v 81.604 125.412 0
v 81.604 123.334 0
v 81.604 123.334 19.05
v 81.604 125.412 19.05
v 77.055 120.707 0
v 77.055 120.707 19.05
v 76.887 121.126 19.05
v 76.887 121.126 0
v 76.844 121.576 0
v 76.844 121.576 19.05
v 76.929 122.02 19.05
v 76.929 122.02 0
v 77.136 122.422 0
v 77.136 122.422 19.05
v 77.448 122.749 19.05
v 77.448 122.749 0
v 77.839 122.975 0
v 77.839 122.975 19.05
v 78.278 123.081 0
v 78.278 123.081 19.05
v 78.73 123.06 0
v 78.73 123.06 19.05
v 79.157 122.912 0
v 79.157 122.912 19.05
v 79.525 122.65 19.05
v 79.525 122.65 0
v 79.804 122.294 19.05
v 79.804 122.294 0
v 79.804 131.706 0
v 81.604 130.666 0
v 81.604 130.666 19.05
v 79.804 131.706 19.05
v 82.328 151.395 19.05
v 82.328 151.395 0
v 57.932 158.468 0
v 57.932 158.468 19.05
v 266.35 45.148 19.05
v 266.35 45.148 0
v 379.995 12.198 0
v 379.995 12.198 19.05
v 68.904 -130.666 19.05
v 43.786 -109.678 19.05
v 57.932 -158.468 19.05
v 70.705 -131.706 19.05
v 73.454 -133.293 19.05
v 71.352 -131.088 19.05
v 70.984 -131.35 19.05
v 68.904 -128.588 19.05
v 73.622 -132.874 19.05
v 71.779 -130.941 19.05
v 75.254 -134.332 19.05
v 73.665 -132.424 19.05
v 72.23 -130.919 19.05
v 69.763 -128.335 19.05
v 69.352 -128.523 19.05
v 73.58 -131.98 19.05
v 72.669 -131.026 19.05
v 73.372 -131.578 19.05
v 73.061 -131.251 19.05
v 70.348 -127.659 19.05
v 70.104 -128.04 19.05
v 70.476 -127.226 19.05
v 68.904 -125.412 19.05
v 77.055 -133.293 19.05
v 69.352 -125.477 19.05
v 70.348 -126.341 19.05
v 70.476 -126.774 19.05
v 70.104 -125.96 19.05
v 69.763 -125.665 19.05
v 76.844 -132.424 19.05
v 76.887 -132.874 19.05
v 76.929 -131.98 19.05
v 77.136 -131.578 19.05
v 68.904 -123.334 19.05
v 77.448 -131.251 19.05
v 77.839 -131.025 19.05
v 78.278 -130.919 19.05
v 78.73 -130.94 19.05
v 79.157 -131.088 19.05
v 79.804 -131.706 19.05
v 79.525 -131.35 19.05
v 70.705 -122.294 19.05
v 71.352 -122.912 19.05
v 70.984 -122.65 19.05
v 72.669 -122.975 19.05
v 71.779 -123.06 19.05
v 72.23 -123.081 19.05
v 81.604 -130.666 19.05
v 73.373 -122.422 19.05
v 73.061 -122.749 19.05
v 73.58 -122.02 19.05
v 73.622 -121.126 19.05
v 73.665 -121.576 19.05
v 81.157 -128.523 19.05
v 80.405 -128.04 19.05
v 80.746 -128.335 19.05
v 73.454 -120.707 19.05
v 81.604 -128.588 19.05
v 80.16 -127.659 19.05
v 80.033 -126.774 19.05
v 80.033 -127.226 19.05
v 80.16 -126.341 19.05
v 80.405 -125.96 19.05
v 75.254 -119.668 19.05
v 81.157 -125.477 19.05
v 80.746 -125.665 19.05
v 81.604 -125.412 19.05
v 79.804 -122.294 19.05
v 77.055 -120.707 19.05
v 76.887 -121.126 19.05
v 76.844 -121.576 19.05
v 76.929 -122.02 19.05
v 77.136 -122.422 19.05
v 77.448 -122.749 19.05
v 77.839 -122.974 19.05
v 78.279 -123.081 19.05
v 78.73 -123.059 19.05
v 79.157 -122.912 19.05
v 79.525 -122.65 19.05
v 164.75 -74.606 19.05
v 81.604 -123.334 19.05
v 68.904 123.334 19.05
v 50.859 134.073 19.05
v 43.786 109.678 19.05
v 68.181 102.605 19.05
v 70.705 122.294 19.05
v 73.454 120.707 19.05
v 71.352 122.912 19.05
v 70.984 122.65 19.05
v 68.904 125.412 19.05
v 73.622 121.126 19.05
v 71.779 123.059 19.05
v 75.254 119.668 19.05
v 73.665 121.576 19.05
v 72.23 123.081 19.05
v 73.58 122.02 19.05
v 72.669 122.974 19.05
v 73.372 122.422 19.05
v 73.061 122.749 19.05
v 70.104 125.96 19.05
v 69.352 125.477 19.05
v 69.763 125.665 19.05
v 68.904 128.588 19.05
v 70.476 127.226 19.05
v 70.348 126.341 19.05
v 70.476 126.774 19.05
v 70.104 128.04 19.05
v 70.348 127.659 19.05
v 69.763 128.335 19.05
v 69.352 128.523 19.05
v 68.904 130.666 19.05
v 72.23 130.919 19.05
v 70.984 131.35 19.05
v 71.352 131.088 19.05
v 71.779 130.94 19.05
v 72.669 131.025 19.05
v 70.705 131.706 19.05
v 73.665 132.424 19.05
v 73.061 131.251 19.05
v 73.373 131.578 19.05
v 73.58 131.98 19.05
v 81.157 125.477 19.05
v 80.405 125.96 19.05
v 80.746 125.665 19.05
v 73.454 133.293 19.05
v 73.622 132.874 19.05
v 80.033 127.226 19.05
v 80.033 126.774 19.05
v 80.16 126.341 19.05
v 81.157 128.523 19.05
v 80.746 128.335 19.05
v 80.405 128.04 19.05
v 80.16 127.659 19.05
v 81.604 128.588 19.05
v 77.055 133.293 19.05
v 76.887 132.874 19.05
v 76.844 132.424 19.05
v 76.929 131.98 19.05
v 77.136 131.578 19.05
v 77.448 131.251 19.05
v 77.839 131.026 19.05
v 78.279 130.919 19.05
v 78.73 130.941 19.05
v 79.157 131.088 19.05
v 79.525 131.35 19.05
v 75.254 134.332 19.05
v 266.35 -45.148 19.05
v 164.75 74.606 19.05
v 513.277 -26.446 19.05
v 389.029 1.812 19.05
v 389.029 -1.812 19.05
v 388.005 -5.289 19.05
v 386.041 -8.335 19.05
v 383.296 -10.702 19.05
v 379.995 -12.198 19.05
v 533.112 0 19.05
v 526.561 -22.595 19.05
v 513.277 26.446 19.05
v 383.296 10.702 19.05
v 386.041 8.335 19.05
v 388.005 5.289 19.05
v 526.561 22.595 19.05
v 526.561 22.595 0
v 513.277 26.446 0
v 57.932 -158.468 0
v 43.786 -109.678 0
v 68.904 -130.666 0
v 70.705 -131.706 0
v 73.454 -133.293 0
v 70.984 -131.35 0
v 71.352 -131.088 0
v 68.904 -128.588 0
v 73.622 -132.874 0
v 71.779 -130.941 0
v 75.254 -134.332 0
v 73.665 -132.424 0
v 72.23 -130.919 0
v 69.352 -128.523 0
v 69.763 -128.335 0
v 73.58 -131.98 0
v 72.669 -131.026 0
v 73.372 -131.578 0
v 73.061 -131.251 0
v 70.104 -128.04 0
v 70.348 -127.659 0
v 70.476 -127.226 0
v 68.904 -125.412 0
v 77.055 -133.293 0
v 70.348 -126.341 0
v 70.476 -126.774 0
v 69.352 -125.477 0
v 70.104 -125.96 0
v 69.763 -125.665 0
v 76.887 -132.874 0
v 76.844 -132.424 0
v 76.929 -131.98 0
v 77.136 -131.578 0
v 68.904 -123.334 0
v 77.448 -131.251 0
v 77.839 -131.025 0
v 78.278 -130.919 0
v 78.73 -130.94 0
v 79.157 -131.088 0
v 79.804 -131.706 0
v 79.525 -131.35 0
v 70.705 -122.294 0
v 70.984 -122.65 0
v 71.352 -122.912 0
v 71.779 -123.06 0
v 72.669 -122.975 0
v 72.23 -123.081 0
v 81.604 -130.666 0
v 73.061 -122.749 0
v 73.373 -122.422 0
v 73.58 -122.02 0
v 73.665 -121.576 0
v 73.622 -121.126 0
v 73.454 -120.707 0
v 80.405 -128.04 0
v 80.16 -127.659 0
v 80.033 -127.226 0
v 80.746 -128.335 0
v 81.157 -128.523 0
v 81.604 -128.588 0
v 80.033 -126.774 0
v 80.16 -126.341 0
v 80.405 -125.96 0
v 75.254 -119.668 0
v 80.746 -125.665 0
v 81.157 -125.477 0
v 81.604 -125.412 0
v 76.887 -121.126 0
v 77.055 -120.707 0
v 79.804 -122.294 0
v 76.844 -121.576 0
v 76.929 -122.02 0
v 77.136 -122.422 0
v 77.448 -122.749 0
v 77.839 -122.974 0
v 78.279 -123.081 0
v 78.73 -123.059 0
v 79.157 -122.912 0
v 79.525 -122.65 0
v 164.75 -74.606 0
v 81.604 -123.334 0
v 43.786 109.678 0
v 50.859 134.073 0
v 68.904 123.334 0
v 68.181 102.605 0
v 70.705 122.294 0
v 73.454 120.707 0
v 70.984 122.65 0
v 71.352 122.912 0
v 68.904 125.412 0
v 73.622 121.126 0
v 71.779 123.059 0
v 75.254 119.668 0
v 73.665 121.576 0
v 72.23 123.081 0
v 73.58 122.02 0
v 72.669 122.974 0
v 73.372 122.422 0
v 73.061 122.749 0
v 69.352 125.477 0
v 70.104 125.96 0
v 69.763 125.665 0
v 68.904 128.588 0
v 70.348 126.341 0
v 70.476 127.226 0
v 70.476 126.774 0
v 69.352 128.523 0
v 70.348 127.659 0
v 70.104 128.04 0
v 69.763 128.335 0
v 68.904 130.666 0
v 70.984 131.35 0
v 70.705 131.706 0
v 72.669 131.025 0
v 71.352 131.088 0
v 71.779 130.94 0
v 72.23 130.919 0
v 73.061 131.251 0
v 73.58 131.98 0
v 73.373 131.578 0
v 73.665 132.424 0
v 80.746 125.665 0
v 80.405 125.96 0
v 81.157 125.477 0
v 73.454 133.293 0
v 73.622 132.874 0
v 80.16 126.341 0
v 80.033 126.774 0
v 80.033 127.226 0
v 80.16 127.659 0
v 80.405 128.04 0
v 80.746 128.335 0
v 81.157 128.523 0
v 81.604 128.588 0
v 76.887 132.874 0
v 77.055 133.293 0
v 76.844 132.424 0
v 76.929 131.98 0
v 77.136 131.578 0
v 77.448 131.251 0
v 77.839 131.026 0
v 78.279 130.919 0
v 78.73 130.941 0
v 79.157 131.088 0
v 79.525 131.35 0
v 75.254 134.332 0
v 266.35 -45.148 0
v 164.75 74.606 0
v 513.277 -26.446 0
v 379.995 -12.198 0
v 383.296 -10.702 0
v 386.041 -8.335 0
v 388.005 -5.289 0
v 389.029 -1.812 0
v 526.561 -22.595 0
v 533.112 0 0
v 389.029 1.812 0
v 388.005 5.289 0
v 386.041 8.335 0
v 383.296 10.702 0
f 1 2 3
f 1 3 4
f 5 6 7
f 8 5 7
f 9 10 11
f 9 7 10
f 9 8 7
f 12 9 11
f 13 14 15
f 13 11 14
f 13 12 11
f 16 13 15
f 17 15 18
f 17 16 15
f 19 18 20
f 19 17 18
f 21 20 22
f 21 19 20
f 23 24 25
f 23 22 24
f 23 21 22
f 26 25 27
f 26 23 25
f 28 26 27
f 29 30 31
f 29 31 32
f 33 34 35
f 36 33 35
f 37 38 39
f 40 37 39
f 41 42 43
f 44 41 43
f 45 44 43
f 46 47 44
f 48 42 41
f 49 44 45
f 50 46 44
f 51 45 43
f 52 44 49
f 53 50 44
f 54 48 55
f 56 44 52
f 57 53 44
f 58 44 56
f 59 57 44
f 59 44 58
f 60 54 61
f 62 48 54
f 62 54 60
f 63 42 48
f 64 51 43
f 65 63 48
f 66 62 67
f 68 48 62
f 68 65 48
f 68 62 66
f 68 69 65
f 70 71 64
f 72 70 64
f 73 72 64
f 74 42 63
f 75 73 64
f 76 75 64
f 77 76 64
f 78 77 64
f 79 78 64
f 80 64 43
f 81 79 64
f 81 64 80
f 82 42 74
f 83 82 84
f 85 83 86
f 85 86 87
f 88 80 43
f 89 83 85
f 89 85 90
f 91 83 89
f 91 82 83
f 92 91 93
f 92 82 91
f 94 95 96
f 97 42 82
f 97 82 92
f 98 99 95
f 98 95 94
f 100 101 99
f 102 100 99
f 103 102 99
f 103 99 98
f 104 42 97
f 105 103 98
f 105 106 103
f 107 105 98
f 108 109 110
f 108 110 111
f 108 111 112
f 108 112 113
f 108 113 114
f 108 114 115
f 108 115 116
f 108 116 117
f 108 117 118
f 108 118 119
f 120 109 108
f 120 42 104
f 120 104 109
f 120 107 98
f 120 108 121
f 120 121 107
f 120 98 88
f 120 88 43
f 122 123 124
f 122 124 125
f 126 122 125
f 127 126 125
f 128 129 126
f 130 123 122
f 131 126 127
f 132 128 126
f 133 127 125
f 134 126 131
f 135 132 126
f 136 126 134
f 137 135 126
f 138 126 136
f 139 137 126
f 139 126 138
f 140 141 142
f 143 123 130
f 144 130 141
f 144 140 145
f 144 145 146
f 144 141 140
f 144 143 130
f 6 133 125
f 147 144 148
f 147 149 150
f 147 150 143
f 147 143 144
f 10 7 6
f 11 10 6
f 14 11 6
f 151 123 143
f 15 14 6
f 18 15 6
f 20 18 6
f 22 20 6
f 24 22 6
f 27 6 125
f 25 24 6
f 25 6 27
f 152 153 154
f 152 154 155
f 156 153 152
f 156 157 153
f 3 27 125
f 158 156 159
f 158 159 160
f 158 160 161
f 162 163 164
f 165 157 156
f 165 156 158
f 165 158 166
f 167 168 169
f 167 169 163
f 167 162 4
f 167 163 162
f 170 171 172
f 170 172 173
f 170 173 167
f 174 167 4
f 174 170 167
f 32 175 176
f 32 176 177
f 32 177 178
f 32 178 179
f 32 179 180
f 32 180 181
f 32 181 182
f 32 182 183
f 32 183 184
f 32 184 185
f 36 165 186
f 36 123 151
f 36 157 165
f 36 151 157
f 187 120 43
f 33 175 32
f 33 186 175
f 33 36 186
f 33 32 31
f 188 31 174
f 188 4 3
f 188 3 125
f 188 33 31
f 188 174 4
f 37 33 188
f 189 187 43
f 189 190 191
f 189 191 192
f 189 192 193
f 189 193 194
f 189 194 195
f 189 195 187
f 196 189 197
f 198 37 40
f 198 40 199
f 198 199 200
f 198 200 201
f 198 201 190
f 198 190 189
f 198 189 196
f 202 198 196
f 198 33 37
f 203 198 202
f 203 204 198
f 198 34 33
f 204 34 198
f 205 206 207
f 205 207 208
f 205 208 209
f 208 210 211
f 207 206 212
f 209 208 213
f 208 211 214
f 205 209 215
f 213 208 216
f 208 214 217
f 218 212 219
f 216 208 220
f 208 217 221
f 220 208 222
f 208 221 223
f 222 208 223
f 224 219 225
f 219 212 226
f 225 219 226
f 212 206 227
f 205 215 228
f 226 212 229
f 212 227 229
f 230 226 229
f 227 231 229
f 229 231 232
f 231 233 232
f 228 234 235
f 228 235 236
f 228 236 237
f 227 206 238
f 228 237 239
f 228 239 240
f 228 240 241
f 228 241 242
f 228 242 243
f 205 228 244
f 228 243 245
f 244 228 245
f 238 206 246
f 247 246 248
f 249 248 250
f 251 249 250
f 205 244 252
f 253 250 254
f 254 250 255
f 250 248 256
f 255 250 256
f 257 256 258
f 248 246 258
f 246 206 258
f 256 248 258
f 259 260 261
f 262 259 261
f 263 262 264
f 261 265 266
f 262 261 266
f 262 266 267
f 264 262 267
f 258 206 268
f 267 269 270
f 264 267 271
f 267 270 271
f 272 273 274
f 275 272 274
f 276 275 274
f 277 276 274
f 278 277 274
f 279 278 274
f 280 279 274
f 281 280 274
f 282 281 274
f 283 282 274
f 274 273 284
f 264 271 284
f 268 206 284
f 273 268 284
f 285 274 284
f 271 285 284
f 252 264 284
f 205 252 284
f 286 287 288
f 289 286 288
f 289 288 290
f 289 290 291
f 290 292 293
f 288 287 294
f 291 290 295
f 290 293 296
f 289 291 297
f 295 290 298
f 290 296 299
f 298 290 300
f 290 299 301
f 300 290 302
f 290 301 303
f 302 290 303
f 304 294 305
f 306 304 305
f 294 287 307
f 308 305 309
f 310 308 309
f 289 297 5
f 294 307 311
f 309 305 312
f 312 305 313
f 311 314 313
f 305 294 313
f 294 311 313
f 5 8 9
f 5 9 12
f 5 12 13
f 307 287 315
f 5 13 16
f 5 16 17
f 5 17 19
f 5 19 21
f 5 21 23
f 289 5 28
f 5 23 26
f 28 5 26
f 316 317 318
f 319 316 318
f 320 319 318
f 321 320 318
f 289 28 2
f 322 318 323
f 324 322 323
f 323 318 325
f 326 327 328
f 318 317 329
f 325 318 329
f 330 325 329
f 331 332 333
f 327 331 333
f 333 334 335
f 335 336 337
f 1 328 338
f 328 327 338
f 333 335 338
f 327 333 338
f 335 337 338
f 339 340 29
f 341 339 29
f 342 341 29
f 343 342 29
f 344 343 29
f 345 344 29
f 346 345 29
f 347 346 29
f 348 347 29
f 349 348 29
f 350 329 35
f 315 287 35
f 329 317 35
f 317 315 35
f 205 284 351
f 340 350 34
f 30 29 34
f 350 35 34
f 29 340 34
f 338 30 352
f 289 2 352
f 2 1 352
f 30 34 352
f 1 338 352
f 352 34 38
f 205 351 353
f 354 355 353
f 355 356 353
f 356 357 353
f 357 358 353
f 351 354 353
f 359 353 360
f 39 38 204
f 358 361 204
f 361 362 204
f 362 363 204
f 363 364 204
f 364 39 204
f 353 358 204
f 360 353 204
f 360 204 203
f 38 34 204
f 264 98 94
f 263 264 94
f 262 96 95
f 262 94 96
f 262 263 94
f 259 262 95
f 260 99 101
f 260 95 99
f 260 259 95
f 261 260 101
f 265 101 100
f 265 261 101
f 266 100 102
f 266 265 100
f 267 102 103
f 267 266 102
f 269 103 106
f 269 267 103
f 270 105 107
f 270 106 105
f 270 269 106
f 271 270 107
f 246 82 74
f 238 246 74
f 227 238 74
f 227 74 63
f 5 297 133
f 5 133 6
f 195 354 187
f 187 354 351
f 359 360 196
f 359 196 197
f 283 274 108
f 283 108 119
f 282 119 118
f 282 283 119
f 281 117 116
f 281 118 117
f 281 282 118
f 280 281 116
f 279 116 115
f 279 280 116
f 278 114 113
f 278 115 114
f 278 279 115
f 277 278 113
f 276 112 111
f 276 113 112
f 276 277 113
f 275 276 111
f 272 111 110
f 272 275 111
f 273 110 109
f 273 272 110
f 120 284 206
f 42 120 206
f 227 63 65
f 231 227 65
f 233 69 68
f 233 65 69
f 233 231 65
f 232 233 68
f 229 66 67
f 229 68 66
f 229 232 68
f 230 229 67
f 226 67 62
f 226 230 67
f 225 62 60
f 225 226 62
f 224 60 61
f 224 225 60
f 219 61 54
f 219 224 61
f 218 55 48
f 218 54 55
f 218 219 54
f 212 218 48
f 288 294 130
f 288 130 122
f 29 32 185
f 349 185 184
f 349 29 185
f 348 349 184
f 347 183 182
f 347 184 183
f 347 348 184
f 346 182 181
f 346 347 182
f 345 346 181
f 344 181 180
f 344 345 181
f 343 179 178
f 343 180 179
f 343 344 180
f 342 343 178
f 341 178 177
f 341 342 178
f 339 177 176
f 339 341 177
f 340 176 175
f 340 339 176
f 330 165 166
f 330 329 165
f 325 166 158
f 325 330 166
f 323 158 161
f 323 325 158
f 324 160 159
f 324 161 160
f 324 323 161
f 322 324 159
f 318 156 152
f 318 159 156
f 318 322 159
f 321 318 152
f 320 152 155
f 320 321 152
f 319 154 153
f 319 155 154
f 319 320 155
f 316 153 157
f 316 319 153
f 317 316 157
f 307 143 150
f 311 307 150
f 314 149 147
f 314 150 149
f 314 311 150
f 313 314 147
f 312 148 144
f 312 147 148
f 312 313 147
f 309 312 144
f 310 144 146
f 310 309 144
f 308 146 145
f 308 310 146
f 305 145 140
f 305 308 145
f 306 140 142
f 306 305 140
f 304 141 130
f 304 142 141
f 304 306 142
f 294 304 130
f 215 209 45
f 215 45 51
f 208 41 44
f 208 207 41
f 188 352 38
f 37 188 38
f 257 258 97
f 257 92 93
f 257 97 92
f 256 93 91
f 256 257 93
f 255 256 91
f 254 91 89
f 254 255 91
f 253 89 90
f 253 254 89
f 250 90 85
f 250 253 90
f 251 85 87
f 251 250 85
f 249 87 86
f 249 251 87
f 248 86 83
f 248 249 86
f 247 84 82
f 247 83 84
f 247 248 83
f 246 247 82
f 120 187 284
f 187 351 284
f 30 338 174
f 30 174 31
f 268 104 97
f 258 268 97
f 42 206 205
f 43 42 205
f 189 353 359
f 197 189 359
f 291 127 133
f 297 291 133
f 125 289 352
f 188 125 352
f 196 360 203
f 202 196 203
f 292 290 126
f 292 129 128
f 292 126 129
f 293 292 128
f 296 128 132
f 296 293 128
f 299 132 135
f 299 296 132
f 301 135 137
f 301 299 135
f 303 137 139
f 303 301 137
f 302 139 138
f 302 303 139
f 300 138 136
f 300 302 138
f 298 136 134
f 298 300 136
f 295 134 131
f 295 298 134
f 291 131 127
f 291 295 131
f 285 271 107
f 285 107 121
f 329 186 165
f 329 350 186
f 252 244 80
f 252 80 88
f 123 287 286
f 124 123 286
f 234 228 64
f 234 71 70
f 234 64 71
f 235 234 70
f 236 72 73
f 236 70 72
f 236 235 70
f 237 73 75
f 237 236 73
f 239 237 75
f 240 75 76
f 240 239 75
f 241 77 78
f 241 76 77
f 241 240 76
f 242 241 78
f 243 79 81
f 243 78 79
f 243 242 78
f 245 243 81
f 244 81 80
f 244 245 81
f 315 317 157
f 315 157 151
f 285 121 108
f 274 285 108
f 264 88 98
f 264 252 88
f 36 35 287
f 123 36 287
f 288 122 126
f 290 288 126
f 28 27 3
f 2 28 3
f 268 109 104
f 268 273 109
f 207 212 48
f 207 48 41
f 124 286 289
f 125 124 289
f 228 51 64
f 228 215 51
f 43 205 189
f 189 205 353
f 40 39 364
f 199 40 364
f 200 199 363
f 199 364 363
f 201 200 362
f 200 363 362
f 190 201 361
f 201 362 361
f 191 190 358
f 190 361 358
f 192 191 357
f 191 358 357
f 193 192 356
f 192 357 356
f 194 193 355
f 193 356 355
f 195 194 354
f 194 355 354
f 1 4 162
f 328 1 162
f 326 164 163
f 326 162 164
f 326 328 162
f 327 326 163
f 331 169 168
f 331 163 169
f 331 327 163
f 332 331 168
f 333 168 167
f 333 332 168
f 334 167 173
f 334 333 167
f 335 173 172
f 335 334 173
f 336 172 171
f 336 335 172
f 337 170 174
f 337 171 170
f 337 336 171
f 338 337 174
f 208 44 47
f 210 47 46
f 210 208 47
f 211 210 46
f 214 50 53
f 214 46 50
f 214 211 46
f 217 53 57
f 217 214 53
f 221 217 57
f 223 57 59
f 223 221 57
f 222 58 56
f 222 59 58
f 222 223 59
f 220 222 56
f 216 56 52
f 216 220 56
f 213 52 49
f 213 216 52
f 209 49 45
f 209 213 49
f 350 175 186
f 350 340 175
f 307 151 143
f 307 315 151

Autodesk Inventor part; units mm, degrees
ref_plane "YZ Plane" through (0, 0, 0) normal (1, 0, 0) x (0, 1, 0)
ref_plane "XZ Plane" through (0, 0, 0) normal (0, 1, 0) x (-1, 0, 0)
ref_plane "Work Plane1" through (0, 0, 0) normal (0, 0, 1) x (1, 0, 0)
sketch "Sketch1" plane through (0, 0, 0) normal (0, 0, 1) x (1, 0, 0)
  line L0 (73.4542, 120.707) -> (75.2544, 119.6677) projected
  arc A0 (73.4542, 120.707) -> (70.7046, 122.2945) centre (72.0794, 121.5007) ccw projected
  line L1 (68.9044, 123.3338) -> (70.7046, 122.2945) projected
  line L2 (68.9044, 125.4125) -> (68.9044, 123.3338) projected
  arc A1 (68.9044, 125.4125) -> (68.9044, 128.5875) centre (68.9044, 127) ccw projected
  line L3 (68.9044, 130.6662) -> (68.9044, 128.5875) projected
  line L4 (70.7046, 131.7055) -> (68.9044, 130.6662) projected
  arc A2 (70.7046, 131.7055) -> (73.4542, 133.293) centre (72.0794, 132.4993) ccw projected
  line L5 (75.2544, 134.3323) -> (73.4542, 133.293) projected
  line L6 (77.0546, 133.293) -> (75.2544, 134.3323) projected
  arc A3 (77.0546, 133.293) -> (79.8042, 131.7055) centre (78.4294, 132.4993) ccw projected
  line L7 (81.6044, 130.6662) -> (79.8042, 131.7055) projected
  line L8 (81.6044, 128.5875) -> (81.6044, 130.6662) projected
  arc A4 (81.6044, 128.5875) -> (81.6044, 125.4125) centre (81.6044, 127) ccw projected
  line L9 (81.6044, 123.3338) -> (81.6044, 125.4125) projected
  line L10 (79.8042, 122.2945) -> (81.6044, 123.3338) projected
  arc A5 (79.8042, 122.2945) -> (77.0546, 120.707) centre (78.4294, 121.5007) ccw projected
  line L11 (75.2544, 119.6677) -> (77.0546, 120.707) projected
  circle A6 centre (75.2544, 127) radius 2.9337 projected
  line L12 (73.4542, -133.293) -> (75.2544, -134.3323) projected
  arc A7 (73.4542, -133.293) -> (70.7046, -131.7055) centre (72.0794, -132.4993) ccw projected
  line L13 (68.9044, -130.6662) -> (70.7046, -131.7055) projected
  line L14 (68.9044, -128.5875) -> (68.9044, -130.6662) projected
  arc A8 (68.9044, -128.5875) -> (68.9044, -125.4125) centre (68.9044, -127) ccw projected
  line L15 (68.9044, -123.3338) -> (68.9044, -125.4125) projected
  line L16 (70.7046, -122.2945) -> (68.9044, -123.3338) projected
  arc A9 (70.7046, -122.2945) -> (73.4542, -120.707) centre (72.0794, -121.5007) ccw projected
  line L17 (75.2544, -119.6677) -> (73.4542, -120.707) projected
  line L18 (77.0546, -120.707) -> (75.2544, -119.6677) projected
  arc A10 (77.0546, -120.707) -> (79.8042, -122.2945) centre (78.4294, -121.5007) ccw projected
  line L19 (81.6044, -123.3338) -> (79.8042, -122.2945) projected
  line L20 (81.6044, -125.4125) -> (81.6044, -123.3338) projected
  arc A11 (81.6044, -125.4125) -> (81.6044, -128.5875) centre (81.6044, -127) ccw projected
  line L21 (81.6044, -130.6662) -> (81.6044, -128.5875) projected
  line L22 (79.8042, -131.7055) -> (81.6044, -130.6662) projected
  arc A12 (79.8042, -131.7055) -> (77.0546, -133.293) centre (78.4294, -132.4993) ccw projected
  line L23 (75.2544, -134.3323) -> (77.0546, -133.293) projected
  circle A13 centre (75.2544, -127) radius 2.9337 projected
  line L24 (75.2544, -127) -> (513.2774, 0) construction
  line L25 (106.8774, 406.4) -> (106.8774, -406.4) projected
  line L26 (106.8774, 0) -> (513.2774, 0)
  line L27 (513.2774, 0) -> (75.2544, 127) construction
  line L28 (75.2544, 127) -> (68.1812, 102.6047) construction
  line L29 (75.2544, 127) -> (82.3275, 151.3953) construction
  line L30 (75.2544, 127) -> (50.8591, 134.0732) construction
  line L31 (82.3275, 151.3953) -> (57.9322, 158.4684)
  line L32 (57.9322, 158.4684) -> (50.8591, 134.0732)
  line L33 (50.8591, 134.0732) -> (43.7859, 109.6779)
  line L34 (43.7859, 109.6779) -> (68.1812, 102.6047)
  line L35 (82.3275, 151.3953) -> (513.2774, 26.4461)
  line L36 (68.1812, 102.6047) -> (164.7505, 74.6055)
  line L37 (538.647, 19.0904) -> (533.1119, 0)
  line L38 (524.5007, 29.7002) -> (513.2774, 26.4461)
  line L39 (43.7859, -109.6779) -> (57.9322, -158.4684)
  line L40 (57.9322, -158.4684) -> (513.2774, -26.4461)
  line L41 (538.647, -19.0904) -> (533.1119, 0)
  line L42 (266.3505, 45.1477) -> (379.9952, 12.1976)
  line L43 (164.7505, 74.6055) -> (266.3505, 45.1477)
  line L44 (164.7505, -74.6055) -> (43.7859, -109.6779)
  line L45 (266.3505, -45.1477) -> (164.7505, -74.6055)
  line L46 (379.9952, -12.1976) -> (266.3505, -45.1477)
  line L47 (379.9952, 12.1976) -> (513.2774, -26.4461) construction
  line L48 (513.2774, -26.4461) -> (524.5007, -29.7002)
  line L49 (513.2774, 26.4461) -> (526.5609, 22.5947)
  line L50 (513.2774, 26.4461) -> (379.9952, -12.1976) construction
  line L51 (513.2774, -26.4461) -> (538.647, -19.0904)
  arc A14 (379.9952, -12.1976) -> (379.9952, 12.1976) centre (376.4586, 0) ccw
  line L52 (526.5609, -22.5947) -> (524.5007, -29.7002)
  line L53 (526.5609, 22.5947) -> (538.647, 19.0904)
  line L54 (533.1119, 0) -> (526.5609, -22.5947)
  line L55 (533.1119, 0) -> (524.5007, 29.7002)
  point P0 (0, 0)
  dimension "d0" = 406.4
  dimension "d1" = 25.4
  dimension "d2" = 25.4
  dimension "d3" = 25.4
  dimension "d4" = 19.05
  dimension "d7" = 25.4
  dimension "d8" = 25.4
  dimension "d9" = 25.4
  dimension "d10" = 19.05
  dimension "d15" = 12.7
extrude "Extrusion2" add sketch "Sketch1" along normal blind 19.05 contours L35 L49 L55 L54 L51 L40 L25 L44 L45 L46 A14 L42 L43 L36 | L25 L36 L34 L33 L32 L31 L35 | L25 L40 L39 L44
properties part number "aFrameBase"
